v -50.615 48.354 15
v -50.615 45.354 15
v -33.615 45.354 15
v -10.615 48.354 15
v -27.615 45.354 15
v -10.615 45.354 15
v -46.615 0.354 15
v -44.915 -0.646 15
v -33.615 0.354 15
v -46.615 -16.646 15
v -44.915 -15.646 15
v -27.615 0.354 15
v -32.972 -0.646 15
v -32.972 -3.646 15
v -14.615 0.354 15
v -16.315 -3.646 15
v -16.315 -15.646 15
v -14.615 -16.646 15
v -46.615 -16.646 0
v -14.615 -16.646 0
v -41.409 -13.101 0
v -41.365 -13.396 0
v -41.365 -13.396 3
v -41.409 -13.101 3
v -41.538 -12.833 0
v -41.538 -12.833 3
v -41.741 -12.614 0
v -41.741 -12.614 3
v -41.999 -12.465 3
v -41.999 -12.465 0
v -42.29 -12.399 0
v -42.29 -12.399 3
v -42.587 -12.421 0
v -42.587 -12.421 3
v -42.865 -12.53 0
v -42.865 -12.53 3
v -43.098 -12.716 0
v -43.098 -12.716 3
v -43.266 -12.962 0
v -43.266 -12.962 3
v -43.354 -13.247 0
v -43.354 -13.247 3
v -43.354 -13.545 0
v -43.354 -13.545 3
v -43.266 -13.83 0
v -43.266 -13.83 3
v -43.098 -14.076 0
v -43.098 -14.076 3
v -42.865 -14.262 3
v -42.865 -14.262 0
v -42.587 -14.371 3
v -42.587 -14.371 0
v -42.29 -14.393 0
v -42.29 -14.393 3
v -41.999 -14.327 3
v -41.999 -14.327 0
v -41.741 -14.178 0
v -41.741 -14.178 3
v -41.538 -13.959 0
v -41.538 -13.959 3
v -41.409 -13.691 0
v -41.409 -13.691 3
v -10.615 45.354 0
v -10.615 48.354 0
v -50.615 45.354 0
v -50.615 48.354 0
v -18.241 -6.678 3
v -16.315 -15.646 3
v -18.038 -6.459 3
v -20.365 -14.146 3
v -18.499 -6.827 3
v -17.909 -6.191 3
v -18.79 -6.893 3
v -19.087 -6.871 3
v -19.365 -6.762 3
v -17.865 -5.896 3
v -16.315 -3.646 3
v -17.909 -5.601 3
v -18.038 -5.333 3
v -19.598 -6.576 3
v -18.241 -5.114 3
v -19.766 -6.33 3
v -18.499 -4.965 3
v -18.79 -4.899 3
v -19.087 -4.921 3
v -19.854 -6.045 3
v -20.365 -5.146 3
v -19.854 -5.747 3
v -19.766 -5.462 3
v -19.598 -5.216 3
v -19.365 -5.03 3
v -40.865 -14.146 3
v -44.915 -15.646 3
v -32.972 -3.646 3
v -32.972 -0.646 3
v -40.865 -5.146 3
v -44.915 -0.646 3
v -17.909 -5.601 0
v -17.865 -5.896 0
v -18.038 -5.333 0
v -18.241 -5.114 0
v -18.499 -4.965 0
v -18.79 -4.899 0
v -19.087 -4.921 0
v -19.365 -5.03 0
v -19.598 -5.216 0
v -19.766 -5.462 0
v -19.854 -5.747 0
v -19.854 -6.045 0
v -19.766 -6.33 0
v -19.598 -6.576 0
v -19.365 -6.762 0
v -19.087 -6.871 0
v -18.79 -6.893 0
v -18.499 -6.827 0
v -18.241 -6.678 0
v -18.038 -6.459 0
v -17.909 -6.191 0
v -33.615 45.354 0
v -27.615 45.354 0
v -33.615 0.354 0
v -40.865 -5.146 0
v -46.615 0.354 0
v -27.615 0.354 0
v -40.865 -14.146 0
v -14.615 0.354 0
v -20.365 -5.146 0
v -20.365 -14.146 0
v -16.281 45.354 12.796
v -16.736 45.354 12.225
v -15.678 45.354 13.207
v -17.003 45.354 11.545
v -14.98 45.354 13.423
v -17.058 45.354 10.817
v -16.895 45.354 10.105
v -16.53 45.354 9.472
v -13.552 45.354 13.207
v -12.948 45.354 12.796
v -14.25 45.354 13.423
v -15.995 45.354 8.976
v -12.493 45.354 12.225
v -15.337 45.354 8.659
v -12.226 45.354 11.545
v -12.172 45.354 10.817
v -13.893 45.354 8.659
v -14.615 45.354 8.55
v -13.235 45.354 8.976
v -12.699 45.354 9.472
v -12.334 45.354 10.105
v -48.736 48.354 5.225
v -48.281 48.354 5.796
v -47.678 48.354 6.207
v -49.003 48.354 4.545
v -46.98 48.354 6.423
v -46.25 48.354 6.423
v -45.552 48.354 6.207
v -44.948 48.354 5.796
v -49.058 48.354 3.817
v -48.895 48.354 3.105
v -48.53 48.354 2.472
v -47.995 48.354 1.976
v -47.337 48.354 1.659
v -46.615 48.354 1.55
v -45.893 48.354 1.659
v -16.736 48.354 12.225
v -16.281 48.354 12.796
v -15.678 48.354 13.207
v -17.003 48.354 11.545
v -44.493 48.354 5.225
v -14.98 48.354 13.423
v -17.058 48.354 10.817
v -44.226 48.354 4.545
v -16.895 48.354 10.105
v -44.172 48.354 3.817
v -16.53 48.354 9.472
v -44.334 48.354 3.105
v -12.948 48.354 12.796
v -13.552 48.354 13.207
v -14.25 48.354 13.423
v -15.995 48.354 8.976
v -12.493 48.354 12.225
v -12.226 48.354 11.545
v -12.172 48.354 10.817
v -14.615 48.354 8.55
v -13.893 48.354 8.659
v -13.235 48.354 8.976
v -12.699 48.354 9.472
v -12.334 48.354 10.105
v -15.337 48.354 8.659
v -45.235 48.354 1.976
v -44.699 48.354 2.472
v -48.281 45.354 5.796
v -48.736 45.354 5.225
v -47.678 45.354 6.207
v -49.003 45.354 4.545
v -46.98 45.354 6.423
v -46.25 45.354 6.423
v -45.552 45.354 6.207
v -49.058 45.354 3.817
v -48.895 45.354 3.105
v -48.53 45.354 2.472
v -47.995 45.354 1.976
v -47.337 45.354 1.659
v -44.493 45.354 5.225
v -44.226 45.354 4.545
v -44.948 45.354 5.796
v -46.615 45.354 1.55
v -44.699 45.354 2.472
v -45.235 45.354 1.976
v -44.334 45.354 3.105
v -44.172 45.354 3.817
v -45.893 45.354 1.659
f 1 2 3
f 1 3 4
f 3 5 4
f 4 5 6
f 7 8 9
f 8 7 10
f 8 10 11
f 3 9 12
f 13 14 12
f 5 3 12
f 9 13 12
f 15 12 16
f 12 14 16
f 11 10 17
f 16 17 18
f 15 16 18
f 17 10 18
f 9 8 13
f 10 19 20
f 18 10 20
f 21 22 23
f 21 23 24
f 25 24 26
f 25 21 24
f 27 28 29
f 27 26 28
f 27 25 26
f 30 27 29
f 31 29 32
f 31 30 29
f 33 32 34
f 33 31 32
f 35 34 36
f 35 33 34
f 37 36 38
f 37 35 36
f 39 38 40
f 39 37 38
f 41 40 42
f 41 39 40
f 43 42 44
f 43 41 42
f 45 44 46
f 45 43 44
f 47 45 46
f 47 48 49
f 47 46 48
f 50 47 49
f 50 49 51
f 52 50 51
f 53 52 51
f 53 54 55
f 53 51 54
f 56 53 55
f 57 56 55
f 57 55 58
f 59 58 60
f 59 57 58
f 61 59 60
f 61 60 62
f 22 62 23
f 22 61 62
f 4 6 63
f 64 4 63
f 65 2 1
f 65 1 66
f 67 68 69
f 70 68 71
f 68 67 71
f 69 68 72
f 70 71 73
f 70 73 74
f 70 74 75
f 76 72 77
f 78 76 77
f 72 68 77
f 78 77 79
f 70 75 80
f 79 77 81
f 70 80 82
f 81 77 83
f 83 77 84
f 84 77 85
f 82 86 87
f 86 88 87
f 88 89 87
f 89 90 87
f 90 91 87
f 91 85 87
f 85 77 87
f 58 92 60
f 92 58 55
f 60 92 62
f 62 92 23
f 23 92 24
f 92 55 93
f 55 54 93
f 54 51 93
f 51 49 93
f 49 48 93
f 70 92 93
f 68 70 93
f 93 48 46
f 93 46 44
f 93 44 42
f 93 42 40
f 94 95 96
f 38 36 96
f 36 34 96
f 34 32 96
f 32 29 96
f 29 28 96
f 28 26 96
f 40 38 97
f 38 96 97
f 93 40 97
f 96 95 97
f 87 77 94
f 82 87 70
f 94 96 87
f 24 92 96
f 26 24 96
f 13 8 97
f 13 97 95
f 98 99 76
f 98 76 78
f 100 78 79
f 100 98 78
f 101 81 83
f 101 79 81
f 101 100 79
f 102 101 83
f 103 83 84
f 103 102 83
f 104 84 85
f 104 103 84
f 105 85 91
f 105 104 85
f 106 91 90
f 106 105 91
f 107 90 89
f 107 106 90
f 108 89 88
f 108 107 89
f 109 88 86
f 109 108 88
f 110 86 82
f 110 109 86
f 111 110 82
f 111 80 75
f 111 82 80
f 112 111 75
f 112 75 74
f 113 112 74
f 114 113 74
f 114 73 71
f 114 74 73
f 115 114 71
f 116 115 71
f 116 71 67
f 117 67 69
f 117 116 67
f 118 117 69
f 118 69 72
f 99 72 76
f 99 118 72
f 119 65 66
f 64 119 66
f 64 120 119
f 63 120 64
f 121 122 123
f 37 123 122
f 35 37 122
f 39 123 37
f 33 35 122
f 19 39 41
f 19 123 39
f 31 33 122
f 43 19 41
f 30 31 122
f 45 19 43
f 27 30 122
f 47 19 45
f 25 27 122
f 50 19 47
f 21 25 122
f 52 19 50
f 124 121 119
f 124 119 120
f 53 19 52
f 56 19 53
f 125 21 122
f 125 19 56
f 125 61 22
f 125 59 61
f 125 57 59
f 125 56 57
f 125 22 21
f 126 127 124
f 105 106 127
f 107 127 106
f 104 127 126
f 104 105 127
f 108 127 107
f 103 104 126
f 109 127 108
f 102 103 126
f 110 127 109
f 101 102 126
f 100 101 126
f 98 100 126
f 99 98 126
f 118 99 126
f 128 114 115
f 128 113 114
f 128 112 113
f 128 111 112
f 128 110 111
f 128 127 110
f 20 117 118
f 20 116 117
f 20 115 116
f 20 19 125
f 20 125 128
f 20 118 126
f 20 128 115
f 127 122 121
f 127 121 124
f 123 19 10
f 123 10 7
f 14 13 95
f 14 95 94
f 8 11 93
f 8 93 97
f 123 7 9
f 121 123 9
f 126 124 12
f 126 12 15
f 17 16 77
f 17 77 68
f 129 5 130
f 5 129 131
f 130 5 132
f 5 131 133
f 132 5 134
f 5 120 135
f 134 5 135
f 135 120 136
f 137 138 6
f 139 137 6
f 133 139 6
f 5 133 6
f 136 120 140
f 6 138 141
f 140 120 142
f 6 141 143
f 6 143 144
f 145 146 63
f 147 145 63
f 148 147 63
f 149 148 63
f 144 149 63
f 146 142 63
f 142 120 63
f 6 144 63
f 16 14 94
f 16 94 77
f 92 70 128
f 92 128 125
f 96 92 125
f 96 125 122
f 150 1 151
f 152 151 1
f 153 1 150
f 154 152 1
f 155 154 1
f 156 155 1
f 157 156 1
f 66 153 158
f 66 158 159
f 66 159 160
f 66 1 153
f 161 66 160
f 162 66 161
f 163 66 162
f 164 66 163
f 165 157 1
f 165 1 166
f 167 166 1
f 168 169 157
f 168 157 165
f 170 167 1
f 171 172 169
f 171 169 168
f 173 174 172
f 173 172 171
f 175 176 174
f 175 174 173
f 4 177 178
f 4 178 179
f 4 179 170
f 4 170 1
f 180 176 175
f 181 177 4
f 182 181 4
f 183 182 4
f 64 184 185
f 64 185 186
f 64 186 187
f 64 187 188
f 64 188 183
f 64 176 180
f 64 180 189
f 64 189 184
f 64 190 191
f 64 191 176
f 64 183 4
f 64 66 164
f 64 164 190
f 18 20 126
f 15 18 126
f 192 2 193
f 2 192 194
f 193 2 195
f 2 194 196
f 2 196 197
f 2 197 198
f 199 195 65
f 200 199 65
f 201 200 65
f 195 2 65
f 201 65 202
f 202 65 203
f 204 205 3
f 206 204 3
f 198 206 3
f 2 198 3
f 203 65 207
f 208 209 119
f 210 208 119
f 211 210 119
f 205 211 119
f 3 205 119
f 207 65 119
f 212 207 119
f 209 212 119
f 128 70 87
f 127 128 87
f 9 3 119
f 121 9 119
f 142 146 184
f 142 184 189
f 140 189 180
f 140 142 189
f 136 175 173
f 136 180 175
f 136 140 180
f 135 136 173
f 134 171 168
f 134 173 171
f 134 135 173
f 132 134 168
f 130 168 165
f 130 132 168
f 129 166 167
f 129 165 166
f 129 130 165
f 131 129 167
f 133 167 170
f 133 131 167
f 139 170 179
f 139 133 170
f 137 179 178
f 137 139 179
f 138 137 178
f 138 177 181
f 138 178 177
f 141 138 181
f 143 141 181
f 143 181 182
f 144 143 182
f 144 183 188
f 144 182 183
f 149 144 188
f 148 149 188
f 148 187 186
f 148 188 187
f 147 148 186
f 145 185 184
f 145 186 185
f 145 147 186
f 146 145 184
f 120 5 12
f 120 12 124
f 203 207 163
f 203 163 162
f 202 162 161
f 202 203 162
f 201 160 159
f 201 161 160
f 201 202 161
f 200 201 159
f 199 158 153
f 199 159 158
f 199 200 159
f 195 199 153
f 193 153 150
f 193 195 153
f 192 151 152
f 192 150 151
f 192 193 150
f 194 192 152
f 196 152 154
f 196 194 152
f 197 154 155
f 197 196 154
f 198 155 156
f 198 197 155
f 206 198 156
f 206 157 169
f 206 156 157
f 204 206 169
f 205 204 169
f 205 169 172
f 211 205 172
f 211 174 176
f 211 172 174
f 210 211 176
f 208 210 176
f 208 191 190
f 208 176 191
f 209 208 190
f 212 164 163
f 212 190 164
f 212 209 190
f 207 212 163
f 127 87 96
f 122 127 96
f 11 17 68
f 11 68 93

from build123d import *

# Parameters (mm, degrees)
ESBO_O1_W                     = 32
ESBO_O1_H                     = 17
RESSALTO_EXTRUS_O1_DEPTH      = 15
RESSALTO_EXTRUS_O2_DEPTH      = 45
RESSALTO_EXTRUS_O2_DEPTH_BACK = 3
ESBO_O2_W                     = 6
ESBO_O2_H                     = 15
ESBO_O3_W                     = 40
ESBO_O3_H                     = 15
RESSALTO_EXTRUS_O3_DEPTH      = 3
CORTE_EXTRUS_O1_DEPTH         = 84.736797348
CORTE_EXTRUS_O1_DEPTH_BACK    = 6
ESBO_O5_R                     = 2.45
CORTE_EXTRUS_O2_DEPTH         = 12
CORTE_EXTRUS_O3_DEPTH         = 72.02091848
CORTE_EXTRUS_O3_DEPTH_BACK    = 72.02091848
ESBO_O8_R                     = 1
CORTE_EXTRUS_O4_DEPTH         = 72.588901806
CORTE_EXTRUS_O4_DEPTH_BACK    = 72.588901806
ESBO_O9_W                     = 20.5
ESBO_O9_H                     = 9


with BuildPart() as part:
    # Esboço1 → Ressalto-extrusão1 (new body)
    with BuildSketch(Plane.XY):
        with Locations((-30.614733331, -8.145893332)):
            Rectangle(ESBO_O1_W, ESBO_O1_H)
    extrude(amount=RESSALTO_EXTRUS_O1_DEPTH)

    # Esboço2 → Ressalto-extrusão2 (add, two sides: drawn at the far end of the back side and taken through both)
    with BuildSketch(Plane(origin=(0, 0.354106668, 0), x_dir=(1, 0, 0), z_dir=(0, 1, 0)).offset(-RESSALTO_EXTRUS_O2_DEPTH_BACK)):
        with Locations((-30.614733331, -7.5)):
            Rectangle(ESBO_O2_W, ESBO_O2_H)
    extrude(amount=RESSALTO_EXTRUS_O2_DEPTH + RESSALTO_EXTRUS_O2_DEPTH_BACK)

    # Esboço3 → Ressalto-extrusão3 (add)
    with BuildSketch(Plane(origin=(0, 45.354106668, 0), x_dir=(1, 0, 0), z_dir=(0, 1, 0))):
        with Locations((-30.614733331, -7.5)):
            Rectangle(ESBO_O3_W, ESBO_O3_H)
    extrude(amount=RESSALTO_EXTRUS_O3_DEPTH)

    # Esboço5 → Corte-extrusão1 (cut, two sides: drawn at the far end of the back side and taken through both)
    with BuildSketch(Plane(origin=(0, 48.354106668, 0), x_dir=(1, 0, 0), z_dir=(0, 1, 0)).offset(-CORTE_EXTRUS_O1_DEPTH_BACK)):
        with Locations(Location((-46.614733331, -4, 0), (0, 0, 90))):
            Circle(ESBO_O5_R)
        with Locations(Location((-14.614733331, -11, 0), (0, 0, 90))):
            Circle(ESBO_O5_R)
    extrude(amount=CORTE_EXTRUS_O1_DEPTH + CORTE_EXTRUS_O1_DEPTH_BACK, mode=Mode.SUBTRACT)

    # Esboço7 → Corte-extrusão2 (cut)
    with BuildSketch(Plane.XY.offset(15)):
        Polygon((-44.914733331, -15.645893332), (-44.914733331, -0.645893332), (-32.972451845, -0.645893332), (-32.972451845, -3.645893332), (-16.314733331, -3.645893332), (-16.314733331, -15.645893332), align=None)
    extrude(amount=-CORTE_EXTRUS_O2_DEPTH, mode=Mode.SUBTRACT)

    # Esboço8 → Corte-extrusão3 (cut, two sides: drawn at the far end of the back side and taken through both)
    with BuildSketch(Plane.XY.offset(3).offset(-CORTE_EXTRUS_O3_DEPTH_BACK)):
        with Locations((-42.364733331, -13.395893332)):
            Circle(ESBO_O8_R)
        with Locations((-18.864733331, -5.895893332)):
            Circle(ESBO_O8_R)
    extrude(amount=CORTE_EXTRUS_O3_DEPTH + CORTE_EXTRUS_O3_DEPTH_BACK, mode=Mode.SUBTRACT)

    # Esboço9 → Corte-extrusão4 (cut, two sides: drawn at the far end of the back side and taken through both)
    with BuildSketch(Plane(origin=(0, 0, 0), x_dir=(-1, 0, 0), z_dir=(0, 0, -1)).offset(-CORTE_EXTRUS_O4_DEPTH_BACK)):
        with Locations((30.614733331, -9.645893332)):
            Rectangle(ESBO_O9_W, ESBO_O9_H)
    extrude(amount=CORTE_EXTRUS_O4_DEPTH + CORTE_EXTRUS_O4_DEPTH_BACK, mode=Mode.SUBTRACT)


solid = part.part
